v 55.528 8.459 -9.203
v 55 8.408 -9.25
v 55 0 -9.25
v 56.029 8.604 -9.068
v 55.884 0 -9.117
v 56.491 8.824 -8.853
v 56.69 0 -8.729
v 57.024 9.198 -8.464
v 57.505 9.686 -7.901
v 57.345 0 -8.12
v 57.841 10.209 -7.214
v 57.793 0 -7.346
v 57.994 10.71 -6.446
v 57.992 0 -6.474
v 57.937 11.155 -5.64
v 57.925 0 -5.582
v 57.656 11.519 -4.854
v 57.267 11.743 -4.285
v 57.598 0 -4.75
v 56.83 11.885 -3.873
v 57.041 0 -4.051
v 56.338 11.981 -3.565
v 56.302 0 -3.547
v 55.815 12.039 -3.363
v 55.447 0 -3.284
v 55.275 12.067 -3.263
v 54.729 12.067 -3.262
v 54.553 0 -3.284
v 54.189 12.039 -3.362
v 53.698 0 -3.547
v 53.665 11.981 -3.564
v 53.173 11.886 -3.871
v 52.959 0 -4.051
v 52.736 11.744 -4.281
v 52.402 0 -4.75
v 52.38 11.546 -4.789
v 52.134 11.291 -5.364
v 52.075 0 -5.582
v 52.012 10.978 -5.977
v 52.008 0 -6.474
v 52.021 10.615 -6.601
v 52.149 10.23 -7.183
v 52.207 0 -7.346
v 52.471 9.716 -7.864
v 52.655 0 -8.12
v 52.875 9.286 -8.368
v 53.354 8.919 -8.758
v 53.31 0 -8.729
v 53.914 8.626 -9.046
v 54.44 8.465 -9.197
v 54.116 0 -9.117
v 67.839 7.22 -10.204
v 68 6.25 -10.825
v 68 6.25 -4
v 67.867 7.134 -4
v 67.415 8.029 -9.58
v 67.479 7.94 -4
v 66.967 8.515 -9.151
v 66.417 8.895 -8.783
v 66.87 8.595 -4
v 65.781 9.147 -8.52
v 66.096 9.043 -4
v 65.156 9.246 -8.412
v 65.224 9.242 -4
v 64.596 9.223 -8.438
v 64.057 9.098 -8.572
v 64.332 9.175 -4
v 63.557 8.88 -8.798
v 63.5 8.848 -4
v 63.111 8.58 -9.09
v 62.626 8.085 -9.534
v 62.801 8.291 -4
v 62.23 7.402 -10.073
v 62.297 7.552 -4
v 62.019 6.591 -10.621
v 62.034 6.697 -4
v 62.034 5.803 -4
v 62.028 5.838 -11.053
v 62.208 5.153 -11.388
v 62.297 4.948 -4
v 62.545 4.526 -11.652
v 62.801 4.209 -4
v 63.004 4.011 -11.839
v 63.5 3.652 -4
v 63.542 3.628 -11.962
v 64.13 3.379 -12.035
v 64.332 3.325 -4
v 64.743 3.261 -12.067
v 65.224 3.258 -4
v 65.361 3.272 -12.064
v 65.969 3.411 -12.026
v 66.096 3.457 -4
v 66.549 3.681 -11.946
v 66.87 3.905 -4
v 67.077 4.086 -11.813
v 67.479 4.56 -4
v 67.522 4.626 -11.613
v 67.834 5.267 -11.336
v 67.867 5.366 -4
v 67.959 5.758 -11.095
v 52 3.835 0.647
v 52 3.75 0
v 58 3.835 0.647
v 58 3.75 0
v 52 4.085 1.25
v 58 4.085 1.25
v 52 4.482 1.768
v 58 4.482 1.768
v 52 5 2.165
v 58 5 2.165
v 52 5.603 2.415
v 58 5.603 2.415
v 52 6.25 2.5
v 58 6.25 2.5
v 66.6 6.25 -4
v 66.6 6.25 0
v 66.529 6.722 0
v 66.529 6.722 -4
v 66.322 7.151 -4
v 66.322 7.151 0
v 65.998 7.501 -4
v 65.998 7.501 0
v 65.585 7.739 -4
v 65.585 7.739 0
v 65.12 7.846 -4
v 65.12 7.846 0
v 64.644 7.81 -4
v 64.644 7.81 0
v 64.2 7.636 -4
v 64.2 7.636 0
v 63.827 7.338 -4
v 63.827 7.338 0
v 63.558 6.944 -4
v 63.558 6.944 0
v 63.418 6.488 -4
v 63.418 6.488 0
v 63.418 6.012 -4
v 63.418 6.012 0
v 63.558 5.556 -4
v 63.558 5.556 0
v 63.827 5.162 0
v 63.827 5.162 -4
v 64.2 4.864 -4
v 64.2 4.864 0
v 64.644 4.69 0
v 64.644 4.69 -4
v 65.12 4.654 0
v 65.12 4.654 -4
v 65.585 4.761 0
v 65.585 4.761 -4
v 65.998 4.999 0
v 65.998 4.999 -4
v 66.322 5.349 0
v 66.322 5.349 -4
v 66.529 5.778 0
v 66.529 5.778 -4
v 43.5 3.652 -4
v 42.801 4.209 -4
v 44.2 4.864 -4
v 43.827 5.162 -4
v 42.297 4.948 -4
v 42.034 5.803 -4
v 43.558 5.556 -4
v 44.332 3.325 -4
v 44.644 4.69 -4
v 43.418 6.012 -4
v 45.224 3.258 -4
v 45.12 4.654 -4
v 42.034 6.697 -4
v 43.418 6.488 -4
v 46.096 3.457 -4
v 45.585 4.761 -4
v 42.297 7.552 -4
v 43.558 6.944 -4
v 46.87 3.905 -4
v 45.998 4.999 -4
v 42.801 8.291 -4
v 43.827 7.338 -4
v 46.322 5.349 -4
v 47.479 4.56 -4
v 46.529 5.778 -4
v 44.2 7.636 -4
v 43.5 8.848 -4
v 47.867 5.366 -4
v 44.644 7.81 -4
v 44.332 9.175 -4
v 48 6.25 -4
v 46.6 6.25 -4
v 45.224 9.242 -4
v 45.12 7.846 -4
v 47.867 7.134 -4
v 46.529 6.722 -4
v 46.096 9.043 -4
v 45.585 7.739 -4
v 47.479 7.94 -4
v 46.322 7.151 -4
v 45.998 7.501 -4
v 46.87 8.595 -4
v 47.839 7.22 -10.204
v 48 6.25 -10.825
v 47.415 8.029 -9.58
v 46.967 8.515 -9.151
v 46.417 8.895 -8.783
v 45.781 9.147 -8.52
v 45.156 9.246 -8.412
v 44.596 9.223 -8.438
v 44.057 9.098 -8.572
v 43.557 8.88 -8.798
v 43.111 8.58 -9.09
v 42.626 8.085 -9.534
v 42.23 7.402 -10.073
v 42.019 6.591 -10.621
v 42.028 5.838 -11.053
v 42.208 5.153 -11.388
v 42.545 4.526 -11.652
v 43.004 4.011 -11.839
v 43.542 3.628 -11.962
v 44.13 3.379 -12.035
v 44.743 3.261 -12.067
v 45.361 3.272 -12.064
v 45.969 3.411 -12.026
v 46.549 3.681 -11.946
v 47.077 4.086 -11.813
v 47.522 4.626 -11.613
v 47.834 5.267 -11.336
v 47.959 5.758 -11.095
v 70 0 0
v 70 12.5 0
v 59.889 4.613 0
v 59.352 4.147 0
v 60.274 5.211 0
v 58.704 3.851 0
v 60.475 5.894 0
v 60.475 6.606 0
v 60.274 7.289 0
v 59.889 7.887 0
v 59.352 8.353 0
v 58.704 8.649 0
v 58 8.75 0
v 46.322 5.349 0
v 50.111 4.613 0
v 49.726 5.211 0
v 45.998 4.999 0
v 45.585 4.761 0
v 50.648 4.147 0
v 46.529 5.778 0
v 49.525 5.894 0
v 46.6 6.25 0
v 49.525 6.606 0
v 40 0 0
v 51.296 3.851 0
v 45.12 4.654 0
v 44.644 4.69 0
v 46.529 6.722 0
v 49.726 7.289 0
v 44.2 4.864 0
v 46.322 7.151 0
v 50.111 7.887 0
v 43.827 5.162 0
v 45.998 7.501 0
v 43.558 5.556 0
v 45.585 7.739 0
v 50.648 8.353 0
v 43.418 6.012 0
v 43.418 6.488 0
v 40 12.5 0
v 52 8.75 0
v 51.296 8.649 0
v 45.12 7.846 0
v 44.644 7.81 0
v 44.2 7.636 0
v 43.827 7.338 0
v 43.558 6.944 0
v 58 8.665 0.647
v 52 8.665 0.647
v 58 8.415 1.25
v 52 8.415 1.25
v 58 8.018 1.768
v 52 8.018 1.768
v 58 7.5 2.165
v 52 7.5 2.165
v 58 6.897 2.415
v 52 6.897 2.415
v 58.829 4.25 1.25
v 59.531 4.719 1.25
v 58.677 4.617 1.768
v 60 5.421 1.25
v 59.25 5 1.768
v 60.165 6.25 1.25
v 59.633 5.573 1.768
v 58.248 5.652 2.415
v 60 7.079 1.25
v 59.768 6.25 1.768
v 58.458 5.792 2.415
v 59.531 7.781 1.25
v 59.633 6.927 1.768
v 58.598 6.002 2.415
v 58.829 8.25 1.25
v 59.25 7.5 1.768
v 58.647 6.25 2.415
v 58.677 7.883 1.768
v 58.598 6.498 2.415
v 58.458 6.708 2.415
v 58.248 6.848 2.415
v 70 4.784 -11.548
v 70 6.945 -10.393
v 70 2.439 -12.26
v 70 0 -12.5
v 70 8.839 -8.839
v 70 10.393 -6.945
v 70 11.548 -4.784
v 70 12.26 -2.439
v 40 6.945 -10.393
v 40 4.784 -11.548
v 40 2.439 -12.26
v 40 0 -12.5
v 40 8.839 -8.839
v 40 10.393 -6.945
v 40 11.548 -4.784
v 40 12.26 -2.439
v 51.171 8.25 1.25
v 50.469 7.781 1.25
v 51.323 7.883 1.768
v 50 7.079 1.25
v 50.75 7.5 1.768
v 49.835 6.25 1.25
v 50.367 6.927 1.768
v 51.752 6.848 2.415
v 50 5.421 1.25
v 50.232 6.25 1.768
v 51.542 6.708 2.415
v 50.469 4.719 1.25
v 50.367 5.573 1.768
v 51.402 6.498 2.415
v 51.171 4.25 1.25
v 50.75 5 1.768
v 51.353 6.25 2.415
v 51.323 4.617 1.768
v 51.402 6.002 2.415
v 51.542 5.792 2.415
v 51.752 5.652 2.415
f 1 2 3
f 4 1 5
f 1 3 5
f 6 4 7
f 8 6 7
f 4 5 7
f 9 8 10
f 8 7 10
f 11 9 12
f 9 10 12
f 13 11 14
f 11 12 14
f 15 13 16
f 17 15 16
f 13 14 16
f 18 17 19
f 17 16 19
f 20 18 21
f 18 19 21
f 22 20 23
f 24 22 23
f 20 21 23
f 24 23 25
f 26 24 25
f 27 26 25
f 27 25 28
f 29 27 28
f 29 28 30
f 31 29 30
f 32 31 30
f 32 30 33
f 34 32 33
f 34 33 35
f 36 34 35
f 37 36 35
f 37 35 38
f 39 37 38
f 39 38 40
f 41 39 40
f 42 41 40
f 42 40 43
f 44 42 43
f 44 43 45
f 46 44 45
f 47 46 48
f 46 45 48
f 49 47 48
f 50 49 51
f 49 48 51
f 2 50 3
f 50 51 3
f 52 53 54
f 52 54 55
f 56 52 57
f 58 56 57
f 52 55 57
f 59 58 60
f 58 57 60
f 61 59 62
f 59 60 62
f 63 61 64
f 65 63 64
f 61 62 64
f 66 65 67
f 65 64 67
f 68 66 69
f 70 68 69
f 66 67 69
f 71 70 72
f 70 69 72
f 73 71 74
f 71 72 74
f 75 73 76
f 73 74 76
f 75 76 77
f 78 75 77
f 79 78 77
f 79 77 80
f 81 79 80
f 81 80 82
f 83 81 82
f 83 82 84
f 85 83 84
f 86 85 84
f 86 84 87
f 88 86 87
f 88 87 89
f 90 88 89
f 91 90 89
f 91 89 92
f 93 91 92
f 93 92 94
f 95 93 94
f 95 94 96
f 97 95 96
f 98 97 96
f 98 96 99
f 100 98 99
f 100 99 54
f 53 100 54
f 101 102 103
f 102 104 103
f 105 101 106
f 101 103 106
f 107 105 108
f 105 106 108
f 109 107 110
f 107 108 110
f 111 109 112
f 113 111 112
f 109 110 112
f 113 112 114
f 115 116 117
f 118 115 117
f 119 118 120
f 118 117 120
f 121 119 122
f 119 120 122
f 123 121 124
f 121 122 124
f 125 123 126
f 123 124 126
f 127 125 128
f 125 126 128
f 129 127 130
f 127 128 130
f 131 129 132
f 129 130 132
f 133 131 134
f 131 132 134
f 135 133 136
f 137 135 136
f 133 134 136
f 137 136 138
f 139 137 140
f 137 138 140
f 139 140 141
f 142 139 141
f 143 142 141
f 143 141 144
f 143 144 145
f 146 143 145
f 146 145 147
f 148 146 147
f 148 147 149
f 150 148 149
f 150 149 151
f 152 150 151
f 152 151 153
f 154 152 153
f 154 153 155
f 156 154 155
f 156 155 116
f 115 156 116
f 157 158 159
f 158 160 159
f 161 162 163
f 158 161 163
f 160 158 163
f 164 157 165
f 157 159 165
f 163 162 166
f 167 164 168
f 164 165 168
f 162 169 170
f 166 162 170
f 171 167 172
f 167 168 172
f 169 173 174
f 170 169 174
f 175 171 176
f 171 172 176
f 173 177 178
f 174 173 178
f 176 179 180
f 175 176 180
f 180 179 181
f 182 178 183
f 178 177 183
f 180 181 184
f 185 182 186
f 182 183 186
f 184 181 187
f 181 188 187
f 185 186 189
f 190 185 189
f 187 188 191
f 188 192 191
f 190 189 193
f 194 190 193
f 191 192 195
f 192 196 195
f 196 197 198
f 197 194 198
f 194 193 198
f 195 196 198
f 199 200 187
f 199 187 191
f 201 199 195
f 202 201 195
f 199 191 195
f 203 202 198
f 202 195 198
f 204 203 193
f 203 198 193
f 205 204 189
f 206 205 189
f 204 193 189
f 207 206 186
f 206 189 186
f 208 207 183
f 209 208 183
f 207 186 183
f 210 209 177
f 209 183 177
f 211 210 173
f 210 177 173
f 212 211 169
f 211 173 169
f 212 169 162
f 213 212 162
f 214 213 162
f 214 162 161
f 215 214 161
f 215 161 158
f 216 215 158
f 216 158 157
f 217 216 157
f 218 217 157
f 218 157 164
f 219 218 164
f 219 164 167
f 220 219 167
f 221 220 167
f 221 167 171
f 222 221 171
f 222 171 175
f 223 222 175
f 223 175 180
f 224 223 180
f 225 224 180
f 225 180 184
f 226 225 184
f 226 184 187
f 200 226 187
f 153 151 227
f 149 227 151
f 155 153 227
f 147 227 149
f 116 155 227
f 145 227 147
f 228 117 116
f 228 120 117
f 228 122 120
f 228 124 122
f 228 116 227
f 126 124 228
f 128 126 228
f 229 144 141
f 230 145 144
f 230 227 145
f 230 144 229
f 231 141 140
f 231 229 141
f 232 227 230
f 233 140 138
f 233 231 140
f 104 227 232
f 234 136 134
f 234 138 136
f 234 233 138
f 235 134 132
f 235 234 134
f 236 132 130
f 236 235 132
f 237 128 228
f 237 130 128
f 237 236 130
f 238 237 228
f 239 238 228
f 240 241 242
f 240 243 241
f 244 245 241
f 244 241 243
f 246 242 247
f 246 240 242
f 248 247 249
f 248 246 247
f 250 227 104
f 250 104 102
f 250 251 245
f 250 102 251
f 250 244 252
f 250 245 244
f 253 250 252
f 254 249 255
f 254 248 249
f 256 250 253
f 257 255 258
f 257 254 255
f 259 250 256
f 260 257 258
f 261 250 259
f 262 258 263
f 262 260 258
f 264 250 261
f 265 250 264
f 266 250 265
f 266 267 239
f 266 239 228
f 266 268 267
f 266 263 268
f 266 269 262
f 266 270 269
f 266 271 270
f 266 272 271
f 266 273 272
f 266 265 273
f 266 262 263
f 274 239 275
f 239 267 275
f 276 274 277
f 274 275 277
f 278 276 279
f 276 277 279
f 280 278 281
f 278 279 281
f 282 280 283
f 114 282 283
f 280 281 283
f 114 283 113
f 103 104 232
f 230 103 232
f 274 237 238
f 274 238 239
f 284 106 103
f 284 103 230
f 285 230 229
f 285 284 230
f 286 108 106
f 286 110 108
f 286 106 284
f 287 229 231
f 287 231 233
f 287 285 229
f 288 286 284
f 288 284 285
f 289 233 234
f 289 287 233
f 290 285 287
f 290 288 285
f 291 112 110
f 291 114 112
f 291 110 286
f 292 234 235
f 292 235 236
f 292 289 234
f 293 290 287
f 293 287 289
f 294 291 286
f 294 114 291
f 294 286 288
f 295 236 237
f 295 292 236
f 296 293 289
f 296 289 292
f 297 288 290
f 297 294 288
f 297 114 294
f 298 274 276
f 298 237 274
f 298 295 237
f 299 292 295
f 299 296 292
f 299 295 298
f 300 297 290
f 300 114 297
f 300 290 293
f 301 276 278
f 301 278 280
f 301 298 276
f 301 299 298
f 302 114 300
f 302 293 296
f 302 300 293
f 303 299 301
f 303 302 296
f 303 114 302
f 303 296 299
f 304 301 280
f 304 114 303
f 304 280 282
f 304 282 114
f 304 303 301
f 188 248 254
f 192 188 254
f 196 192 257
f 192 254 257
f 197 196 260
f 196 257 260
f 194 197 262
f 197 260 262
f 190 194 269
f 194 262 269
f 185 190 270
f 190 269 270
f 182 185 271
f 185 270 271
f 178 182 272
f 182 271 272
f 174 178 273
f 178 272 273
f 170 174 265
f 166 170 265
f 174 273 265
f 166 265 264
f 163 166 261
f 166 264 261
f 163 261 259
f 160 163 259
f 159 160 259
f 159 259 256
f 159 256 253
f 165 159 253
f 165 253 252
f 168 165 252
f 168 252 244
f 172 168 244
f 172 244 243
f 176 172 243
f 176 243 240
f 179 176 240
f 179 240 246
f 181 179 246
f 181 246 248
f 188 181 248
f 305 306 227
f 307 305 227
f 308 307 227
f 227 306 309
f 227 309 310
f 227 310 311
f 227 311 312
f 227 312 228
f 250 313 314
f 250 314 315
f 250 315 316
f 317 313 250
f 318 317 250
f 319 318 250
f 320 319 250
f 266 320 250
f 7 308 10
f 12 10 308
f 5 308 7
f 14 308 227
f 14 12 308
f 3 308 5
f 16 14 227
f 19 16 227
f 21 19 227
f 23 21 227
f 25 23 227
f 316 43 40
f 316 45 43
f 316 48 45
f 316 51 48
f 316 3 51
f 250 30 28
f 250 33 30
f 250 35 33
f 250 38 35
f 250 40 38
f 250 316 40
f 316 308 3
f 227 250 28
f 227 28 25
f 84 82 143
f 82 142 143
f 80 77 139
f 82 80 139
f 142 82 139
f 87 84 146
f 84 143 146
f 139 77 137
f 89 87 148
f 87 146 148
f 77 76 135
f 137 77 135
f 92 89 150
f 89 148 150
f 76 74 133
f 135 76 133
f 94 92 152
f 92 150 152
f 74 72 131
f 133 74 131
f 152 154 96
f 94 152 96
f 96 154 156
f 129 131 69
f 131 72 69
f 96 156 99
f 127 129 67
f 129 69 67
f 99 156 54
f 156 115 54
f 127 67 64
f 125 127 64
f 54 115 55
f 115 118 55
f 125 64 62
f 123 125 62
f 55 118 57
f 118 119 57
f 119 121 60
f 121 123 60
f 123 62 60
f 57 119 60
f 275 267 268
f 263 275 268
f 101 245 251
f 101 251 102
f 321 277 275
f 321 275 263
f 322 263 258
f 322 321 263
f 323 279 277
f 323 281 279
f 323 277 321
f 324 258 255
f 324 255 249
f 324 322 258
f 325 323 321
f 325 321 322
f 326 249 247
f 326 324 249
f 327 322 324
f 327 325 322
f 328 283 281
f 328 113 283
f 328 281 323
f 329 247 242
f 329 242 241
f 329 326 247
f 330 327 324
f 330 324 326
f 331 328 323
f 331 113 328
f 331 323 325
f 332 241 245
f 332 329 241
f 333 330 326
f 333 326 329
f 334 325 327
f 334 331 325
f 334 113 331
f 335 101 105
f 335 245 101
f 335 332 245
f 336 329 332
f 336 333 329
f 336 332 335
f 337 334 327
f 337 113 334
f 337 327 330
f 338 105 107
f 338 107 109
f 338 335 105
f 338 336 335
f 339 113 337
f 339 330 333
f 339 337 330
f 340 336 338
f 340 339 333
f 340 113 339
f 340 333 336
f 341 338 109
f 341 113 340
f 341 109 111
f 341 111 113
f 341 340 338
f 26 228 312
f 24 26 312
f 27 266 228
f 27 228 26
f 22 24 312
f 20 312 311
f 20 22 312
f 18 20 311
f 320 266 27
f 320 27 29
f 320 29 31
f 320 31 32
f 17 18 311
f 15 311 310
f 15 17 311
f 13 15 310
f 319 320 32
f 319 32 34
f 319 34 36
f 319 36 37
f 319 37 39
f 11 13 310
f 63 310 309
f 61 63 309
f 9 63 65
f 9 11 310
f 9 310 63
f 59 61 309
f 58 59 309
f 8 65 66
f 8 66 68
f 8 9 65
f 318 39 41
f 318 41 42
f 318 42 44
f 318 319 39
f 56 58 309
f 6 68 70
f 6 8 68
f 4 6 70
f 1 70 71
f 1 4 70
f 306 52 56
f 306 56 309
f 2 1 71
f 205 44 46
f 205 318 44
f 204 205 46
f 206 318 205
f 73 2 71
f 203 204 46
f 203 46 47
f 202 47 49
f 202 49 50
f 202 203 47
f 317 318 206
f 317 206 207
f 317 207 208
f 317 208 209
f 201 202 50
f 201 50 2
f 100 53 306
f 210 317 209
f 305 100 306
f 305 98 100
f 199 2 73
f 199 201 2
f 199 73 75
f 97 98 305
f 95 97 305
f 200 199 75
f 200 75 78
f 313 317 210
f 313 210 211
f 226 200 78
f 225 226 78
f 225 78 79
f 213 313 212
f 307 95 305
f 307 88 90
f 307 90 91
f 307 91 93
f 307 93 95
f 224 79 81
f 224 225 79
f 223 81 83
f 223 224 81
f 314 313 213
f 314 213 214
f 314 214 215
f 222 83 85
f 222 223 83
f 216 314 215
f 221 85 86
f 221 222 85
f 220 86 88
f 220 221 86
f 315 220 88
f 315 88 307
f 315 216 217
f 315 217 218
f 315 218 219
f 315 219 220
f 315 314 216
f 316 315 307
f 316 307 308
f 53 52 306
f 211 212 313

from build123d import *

# Parameters (mm, degrees)
SALIENTE_EXTRUIR1_DEPTH    = 70
CORTAR_EXTRUIR1_REACH      = 74.198
CORTAR_EXTRUIR1_END_RADIUS = 12.5
CROQUIS2_R                 = 1.6
CORTAR_EXTRUIR2_REACH      = 73.614
CORTAR_EXTRUIR2_END_RADIUS = 12.5
CROQUIS3_R                 = 3
CORTAR_EXTRUIR3_REACH      = 74.198
CORTAR_EXTRUIR3_END_RADIUS = 12.5
CROQUIS4_R                 = 3
CROQUIS6_W                 = 16.861787602
CROQUIS6_H                 = 17.380881654
CORTAR_EXTRUIR5_DEPTH      = 40
SALIENTE_EXTRUIR2_DEPTH    = 2.5
REDONDEO1_R                = 2.5


with BuildPart() as part:
    # Croquis1 → Saliente-Extruir1 (new body)
    with BuildSketch(Plane(origin=(0, 0, 0), x_dir=(0, 0, -1), z_dir=(1, 0, 0))):
        with BuildLine():
            Line((0, 0), (0, 12.5))
            ThreePointArc((0, 12.5), (8.838834765, 8.838834765), (12.5, 0))
            Line((12.5, 0), (0, 0))
        make_face()
    extrude(amount=SALIENTE_EXTRUIR1_DEPTH)

    # Cortar-Extruir1: up to this cylinder (the profile starts inside it)
    cortar_extruir1_end = Plane(origin=(35, 0, 0), z_dir=(-1, 0, 0)) * Cylinder(CORTAR_EXTRUIR1_END_RADIUS, 234.396, mode=Mode.PRIVATE)
    # Croquis2 → Cortar-Extruir1 (cut, up to the surface)
    with BuildSketch(Plane.XY, mode=Mode.PRIVATE) as cortar_extruir1_sk1:
        with Locations((5, 6.25)):
            Circle(CROQUIS2_R)
    cortar_extruir1_tool1 = extrude(cortar_extruir1_sk1.sketch, amount=-CORTAR_EXTRUIR1_REACH, mode=Mode.PRIVATE) & cortar_extruir1_end
    add(cortar_extruir1_tool1.solids().sort_by_distance((5, 6.25, 0))[0], mode=Mode.SUBTRACT)
    # Croquis2 → Cortar-Extruir1 (cut, up to the surface)
    with BuildSketch(Plane.XY, mode=Mode.PRIVATE) as cortar_extruir1_sk2:
        with Locations((25, 6.25)):
            Circle(CROQUIS2_R)
    cortar_extruir1_tool2 = extrude(cortar_extruir1_sk2.sketch, amount=-CORTAR_EXTRUIR1_REACH, mode=Mode.PRIVATE) & cortar_extruir1_end
    add(cortar_extruir1_tool2.solids().sort_by_distance((25, 6.25, 0))[0], mode=Mode.SUBTRACT)
    # Croquis2 → Cortar-Extruir1 (cut, up to the surface)
    with BuildSketch(Plane.XY, mode=Mode.PRIVATE) as cortar_extruir1_sk3:
        with Locations((45, 6.25)):
            Circle(CROQUIS2_R)
    cortar_extruir1_tool3 = extrude(cortar_extruir1_sk3.sketch, amount=-CORTAR_EXTRUIR1_REACH, mode=Mode.PRIVATE) & cortar_extruir1_end
    add(cortar_extruir1_tool3.solids().sort_by_distance((45, 6.25, 0))[0], mode=Mode.SUBTRACT)
    # Croquis2 → Cortar-Extruir1 (cut, up to the surface)
    with BuildSketch(Plane.XY, mode=Mode.PRIVATE) as cortar_extruir1_sk4:
        with Locations((65, 6.25)):
            Circle(CROQUIS2_R)
    cortar_extruir1_tool4 = extrude(cortar_extruir1_sk4.sketch, amount=-CORTAR_EXTRUIR1_REACH, mode=Mode.PRIVATE) & cortar_extruir1_end
    add(cortar_extruir1_tool4.solids().sort_by_distance((65, 6.25, 0))[0], mode=Mode.SUBTRACT)

    # Cortar-Extruir2: up to this cylinder (the profile starts inside it)
    cortar_extruir2_end = Plane(origin=(35, 0, 0), z_dir=(-1, 0, 0)) * Cylinder(CORTAR_EXTRUIR2_END_RADIUS, 233.228, mode=Mode.PRIVATE)
    # Croquis3 → Cortar-Extruir2 (cut, up to the surface)
    with BuildSketch(Plane.XY.offset(-4), mode=Mode.PRIVATE) as cortar_extruir2_sk1:
        with Locations((5, 6.25)):
            Circle(CROQUIS3_R)
    cortar_extruir2_tool1 = extrude(cortar_extruir2_sk1.sketch, amount=-CORTAR_EXTRUIR2_REACH, mode=Mode.PRIVATE) & cortar_extruir2_end
    add(cortar_extruir2_tool1.solids().sort_by_distance((5, 6.25, -4))[0], mode=Mode.SUBTRACT)
    # Croquis3 → Cortar-Extruir2 (cut, up to the surface)
    with BuildSketch(Plane.XY.offset(-4), mode=Mode.PRIVATE) as cortar_extruir2_sk2:
        with Locations((25, 6.25)):
            Circle(CROQUIS3_R)
    cortar_extruir2_tool2 = extrude(cortar_extruir2_sk2.sketch, amount=-CORTAR_EXTRUIR2_REACH, mode=Mode.PRIVATE) & cortar_extruir2_end
    add(cortar_extruir2_tool2.solids().sort_by_distance((25, 6.25, -4))[0], mode=Mode.SUBTRACT)
    # Croquis3 → Cortar-Extruir2 (cut, up to the surface)
    with BuildSketch(Plane.XY.offset(-4), mode=Mode.PRIVATE) as cortar_extruir2_sk3:
        with Locations((45, 6.25)):
            Circle(CROQUIS3_R)
    cortar_extruir2_tool3 = extrude(cortar_extruir2_sk3.sketch, amount=-CORTAR_EXTRUIR2_REACH, mode=Mode.PRIVATE) & cortar_extruir2_end
    add(cortar_extruir2_tool3.solids().sort_by_distance((45, 6.25, -4))[0], mode=Mode.SUBTRACT)
    # Croquis3 → Cortar-Extruir2 (cut, up to the surface)
    with BuildSketch(Plane.XY.offset(-4), mode=Mode.PRIVATE) as cortar_extruir2_sk4:
        with Locations((65, 6.25)):
            Circle(CROQUIS3_R)
    cortar_extruir2_tool4 = extrude(cortar_extruir2_sk4.sketch, amount=-CORTAR_EXTRUIR2_REACH, mode=Mode.PRIVATE) & cortar_extruir2_end
    add(cortar_extruir2_tool4.solids().sort_by_distance((65, 6.25, -4))[0], mode=Mode.SUBTRACT)

    # Cortar-Extruir3: up to this cylinder (the profile starts inside it)
    cortar_extruir3_end = Plane(origin=(35, 0, 0), z_dir=(-1, 0, 0)) * Cylinder(CORTAR_EXTRUIR3_END_RADIUS, 214.396, mode=Mode.PRIVATE)
    # Croquis4 → Cortar-Extruir3 (cut, up to the surface)
    with BuildSketch(Plane.XZ, mode=Mode.PRIVATE) as cortar_extruir3_sk1:
        with Locations(Location((55, -6.25, 0), (0, 0, 270))):
            Circle(CROQUIS4_R)
    cortar_extruir3_tool1 = extrude(cortar_extruir3_sk1.sketch, amount=-CORTAR_EXTRUIR3_REACH, mode=Mode.PRIVATE) & cortar_extruir3_end
    add(cortar_extruir3_tool1.solids().sort_by_distance((55, 0, -6.25))[0], mode=Mode.SUBTRACT)
    # Croquis4 → Cortar-Extruir3 (cut, up to the surface)
    with BuildSketch(Plane.XZ, mode=Mode.PRIVATE) as cortar_extruir3_sk2:
        with Locations(Location((35, -6.25, 0), (0, 0, 270))):
            Circle(CROQUIS4_R)
    cortar_extruir3_tool2 = extrude(cortar_extruir3_sk2.sketch, amount=-CORTAR_EXTRUIR3_REACH, mode=Mode.PRIVATE) & cortar_extruir3_end
    add(cortar_extruir3_tool2.solids().sort_by_distance((35, 0, -6.25))[0], mode=Mode.SUBTRACT)
    # Croquis4 → Cortar-Extruir3 (cut, up to the surface)
    with BuildSketch(Plane.XZ, mode=Mode.PRIVATE) as cortar_extruir3_sk3:
        with Locations(Location((15, -6.25, 0), (0, 0, 270))):
            Circle(CROQUIS4_R)
    cortar_extruir3_tool3 = extrude(cortar_extruir3_sk3.sketch, amount=-CORTAR_EXTRUIR3_REACH, mode=Mode.PRIVATE) & cortar_extruir3_end
    add(cortar_extruir3_tool3.solids().sort_by_distance((15, 0, -6.25))[0], mode=Mode.SUBTRACT)

    # Croquis6 → Cortar-Extruir5 (cut)
    with BuildSketch(Plane.ZY):
        with Locations((-8.430893801, 8.690440827)):
            Rectangle(CROQUIS6_W, CROQUIS6_H)
    extrude(amount=-CORTAR_EXTRUIR5_DEPTH, mode=Mode.SUBTRACT)

    # Croquis7 → Saliente-Extruir2 (add)
    with BuildSketch(Plane.XY):
        with BuildLine():
            Line((58, 8.75), (52, 8.75))
            ThreePointArc((52, 8.75), (49.5, 6.25), (52, 3.75))
            Line((52, 3.75), (58, 3.75))
            ThreePointArc((58, 3.75), (60.5, 6.25), (58, 8.75))
        make_face()
    extrude(amount=SALIENTE_EXTRUIR2_DEPTH)

    # Redondeo1
    redondeo1_edges = [part.edges().sort_by_distance(p)[0] for p in [
        (55, 3.75, 2.5),
        (49.5, 6.25, 2.5),
        (55, 8.75, 2.5),
        (60.5, 6.25, 2.5),
    ]]
    fillet(redondeo1_edges, radius=REDONDEO1_R - 0.0001)  # a hair under: the kernel refuses the full size


solid = part.part
